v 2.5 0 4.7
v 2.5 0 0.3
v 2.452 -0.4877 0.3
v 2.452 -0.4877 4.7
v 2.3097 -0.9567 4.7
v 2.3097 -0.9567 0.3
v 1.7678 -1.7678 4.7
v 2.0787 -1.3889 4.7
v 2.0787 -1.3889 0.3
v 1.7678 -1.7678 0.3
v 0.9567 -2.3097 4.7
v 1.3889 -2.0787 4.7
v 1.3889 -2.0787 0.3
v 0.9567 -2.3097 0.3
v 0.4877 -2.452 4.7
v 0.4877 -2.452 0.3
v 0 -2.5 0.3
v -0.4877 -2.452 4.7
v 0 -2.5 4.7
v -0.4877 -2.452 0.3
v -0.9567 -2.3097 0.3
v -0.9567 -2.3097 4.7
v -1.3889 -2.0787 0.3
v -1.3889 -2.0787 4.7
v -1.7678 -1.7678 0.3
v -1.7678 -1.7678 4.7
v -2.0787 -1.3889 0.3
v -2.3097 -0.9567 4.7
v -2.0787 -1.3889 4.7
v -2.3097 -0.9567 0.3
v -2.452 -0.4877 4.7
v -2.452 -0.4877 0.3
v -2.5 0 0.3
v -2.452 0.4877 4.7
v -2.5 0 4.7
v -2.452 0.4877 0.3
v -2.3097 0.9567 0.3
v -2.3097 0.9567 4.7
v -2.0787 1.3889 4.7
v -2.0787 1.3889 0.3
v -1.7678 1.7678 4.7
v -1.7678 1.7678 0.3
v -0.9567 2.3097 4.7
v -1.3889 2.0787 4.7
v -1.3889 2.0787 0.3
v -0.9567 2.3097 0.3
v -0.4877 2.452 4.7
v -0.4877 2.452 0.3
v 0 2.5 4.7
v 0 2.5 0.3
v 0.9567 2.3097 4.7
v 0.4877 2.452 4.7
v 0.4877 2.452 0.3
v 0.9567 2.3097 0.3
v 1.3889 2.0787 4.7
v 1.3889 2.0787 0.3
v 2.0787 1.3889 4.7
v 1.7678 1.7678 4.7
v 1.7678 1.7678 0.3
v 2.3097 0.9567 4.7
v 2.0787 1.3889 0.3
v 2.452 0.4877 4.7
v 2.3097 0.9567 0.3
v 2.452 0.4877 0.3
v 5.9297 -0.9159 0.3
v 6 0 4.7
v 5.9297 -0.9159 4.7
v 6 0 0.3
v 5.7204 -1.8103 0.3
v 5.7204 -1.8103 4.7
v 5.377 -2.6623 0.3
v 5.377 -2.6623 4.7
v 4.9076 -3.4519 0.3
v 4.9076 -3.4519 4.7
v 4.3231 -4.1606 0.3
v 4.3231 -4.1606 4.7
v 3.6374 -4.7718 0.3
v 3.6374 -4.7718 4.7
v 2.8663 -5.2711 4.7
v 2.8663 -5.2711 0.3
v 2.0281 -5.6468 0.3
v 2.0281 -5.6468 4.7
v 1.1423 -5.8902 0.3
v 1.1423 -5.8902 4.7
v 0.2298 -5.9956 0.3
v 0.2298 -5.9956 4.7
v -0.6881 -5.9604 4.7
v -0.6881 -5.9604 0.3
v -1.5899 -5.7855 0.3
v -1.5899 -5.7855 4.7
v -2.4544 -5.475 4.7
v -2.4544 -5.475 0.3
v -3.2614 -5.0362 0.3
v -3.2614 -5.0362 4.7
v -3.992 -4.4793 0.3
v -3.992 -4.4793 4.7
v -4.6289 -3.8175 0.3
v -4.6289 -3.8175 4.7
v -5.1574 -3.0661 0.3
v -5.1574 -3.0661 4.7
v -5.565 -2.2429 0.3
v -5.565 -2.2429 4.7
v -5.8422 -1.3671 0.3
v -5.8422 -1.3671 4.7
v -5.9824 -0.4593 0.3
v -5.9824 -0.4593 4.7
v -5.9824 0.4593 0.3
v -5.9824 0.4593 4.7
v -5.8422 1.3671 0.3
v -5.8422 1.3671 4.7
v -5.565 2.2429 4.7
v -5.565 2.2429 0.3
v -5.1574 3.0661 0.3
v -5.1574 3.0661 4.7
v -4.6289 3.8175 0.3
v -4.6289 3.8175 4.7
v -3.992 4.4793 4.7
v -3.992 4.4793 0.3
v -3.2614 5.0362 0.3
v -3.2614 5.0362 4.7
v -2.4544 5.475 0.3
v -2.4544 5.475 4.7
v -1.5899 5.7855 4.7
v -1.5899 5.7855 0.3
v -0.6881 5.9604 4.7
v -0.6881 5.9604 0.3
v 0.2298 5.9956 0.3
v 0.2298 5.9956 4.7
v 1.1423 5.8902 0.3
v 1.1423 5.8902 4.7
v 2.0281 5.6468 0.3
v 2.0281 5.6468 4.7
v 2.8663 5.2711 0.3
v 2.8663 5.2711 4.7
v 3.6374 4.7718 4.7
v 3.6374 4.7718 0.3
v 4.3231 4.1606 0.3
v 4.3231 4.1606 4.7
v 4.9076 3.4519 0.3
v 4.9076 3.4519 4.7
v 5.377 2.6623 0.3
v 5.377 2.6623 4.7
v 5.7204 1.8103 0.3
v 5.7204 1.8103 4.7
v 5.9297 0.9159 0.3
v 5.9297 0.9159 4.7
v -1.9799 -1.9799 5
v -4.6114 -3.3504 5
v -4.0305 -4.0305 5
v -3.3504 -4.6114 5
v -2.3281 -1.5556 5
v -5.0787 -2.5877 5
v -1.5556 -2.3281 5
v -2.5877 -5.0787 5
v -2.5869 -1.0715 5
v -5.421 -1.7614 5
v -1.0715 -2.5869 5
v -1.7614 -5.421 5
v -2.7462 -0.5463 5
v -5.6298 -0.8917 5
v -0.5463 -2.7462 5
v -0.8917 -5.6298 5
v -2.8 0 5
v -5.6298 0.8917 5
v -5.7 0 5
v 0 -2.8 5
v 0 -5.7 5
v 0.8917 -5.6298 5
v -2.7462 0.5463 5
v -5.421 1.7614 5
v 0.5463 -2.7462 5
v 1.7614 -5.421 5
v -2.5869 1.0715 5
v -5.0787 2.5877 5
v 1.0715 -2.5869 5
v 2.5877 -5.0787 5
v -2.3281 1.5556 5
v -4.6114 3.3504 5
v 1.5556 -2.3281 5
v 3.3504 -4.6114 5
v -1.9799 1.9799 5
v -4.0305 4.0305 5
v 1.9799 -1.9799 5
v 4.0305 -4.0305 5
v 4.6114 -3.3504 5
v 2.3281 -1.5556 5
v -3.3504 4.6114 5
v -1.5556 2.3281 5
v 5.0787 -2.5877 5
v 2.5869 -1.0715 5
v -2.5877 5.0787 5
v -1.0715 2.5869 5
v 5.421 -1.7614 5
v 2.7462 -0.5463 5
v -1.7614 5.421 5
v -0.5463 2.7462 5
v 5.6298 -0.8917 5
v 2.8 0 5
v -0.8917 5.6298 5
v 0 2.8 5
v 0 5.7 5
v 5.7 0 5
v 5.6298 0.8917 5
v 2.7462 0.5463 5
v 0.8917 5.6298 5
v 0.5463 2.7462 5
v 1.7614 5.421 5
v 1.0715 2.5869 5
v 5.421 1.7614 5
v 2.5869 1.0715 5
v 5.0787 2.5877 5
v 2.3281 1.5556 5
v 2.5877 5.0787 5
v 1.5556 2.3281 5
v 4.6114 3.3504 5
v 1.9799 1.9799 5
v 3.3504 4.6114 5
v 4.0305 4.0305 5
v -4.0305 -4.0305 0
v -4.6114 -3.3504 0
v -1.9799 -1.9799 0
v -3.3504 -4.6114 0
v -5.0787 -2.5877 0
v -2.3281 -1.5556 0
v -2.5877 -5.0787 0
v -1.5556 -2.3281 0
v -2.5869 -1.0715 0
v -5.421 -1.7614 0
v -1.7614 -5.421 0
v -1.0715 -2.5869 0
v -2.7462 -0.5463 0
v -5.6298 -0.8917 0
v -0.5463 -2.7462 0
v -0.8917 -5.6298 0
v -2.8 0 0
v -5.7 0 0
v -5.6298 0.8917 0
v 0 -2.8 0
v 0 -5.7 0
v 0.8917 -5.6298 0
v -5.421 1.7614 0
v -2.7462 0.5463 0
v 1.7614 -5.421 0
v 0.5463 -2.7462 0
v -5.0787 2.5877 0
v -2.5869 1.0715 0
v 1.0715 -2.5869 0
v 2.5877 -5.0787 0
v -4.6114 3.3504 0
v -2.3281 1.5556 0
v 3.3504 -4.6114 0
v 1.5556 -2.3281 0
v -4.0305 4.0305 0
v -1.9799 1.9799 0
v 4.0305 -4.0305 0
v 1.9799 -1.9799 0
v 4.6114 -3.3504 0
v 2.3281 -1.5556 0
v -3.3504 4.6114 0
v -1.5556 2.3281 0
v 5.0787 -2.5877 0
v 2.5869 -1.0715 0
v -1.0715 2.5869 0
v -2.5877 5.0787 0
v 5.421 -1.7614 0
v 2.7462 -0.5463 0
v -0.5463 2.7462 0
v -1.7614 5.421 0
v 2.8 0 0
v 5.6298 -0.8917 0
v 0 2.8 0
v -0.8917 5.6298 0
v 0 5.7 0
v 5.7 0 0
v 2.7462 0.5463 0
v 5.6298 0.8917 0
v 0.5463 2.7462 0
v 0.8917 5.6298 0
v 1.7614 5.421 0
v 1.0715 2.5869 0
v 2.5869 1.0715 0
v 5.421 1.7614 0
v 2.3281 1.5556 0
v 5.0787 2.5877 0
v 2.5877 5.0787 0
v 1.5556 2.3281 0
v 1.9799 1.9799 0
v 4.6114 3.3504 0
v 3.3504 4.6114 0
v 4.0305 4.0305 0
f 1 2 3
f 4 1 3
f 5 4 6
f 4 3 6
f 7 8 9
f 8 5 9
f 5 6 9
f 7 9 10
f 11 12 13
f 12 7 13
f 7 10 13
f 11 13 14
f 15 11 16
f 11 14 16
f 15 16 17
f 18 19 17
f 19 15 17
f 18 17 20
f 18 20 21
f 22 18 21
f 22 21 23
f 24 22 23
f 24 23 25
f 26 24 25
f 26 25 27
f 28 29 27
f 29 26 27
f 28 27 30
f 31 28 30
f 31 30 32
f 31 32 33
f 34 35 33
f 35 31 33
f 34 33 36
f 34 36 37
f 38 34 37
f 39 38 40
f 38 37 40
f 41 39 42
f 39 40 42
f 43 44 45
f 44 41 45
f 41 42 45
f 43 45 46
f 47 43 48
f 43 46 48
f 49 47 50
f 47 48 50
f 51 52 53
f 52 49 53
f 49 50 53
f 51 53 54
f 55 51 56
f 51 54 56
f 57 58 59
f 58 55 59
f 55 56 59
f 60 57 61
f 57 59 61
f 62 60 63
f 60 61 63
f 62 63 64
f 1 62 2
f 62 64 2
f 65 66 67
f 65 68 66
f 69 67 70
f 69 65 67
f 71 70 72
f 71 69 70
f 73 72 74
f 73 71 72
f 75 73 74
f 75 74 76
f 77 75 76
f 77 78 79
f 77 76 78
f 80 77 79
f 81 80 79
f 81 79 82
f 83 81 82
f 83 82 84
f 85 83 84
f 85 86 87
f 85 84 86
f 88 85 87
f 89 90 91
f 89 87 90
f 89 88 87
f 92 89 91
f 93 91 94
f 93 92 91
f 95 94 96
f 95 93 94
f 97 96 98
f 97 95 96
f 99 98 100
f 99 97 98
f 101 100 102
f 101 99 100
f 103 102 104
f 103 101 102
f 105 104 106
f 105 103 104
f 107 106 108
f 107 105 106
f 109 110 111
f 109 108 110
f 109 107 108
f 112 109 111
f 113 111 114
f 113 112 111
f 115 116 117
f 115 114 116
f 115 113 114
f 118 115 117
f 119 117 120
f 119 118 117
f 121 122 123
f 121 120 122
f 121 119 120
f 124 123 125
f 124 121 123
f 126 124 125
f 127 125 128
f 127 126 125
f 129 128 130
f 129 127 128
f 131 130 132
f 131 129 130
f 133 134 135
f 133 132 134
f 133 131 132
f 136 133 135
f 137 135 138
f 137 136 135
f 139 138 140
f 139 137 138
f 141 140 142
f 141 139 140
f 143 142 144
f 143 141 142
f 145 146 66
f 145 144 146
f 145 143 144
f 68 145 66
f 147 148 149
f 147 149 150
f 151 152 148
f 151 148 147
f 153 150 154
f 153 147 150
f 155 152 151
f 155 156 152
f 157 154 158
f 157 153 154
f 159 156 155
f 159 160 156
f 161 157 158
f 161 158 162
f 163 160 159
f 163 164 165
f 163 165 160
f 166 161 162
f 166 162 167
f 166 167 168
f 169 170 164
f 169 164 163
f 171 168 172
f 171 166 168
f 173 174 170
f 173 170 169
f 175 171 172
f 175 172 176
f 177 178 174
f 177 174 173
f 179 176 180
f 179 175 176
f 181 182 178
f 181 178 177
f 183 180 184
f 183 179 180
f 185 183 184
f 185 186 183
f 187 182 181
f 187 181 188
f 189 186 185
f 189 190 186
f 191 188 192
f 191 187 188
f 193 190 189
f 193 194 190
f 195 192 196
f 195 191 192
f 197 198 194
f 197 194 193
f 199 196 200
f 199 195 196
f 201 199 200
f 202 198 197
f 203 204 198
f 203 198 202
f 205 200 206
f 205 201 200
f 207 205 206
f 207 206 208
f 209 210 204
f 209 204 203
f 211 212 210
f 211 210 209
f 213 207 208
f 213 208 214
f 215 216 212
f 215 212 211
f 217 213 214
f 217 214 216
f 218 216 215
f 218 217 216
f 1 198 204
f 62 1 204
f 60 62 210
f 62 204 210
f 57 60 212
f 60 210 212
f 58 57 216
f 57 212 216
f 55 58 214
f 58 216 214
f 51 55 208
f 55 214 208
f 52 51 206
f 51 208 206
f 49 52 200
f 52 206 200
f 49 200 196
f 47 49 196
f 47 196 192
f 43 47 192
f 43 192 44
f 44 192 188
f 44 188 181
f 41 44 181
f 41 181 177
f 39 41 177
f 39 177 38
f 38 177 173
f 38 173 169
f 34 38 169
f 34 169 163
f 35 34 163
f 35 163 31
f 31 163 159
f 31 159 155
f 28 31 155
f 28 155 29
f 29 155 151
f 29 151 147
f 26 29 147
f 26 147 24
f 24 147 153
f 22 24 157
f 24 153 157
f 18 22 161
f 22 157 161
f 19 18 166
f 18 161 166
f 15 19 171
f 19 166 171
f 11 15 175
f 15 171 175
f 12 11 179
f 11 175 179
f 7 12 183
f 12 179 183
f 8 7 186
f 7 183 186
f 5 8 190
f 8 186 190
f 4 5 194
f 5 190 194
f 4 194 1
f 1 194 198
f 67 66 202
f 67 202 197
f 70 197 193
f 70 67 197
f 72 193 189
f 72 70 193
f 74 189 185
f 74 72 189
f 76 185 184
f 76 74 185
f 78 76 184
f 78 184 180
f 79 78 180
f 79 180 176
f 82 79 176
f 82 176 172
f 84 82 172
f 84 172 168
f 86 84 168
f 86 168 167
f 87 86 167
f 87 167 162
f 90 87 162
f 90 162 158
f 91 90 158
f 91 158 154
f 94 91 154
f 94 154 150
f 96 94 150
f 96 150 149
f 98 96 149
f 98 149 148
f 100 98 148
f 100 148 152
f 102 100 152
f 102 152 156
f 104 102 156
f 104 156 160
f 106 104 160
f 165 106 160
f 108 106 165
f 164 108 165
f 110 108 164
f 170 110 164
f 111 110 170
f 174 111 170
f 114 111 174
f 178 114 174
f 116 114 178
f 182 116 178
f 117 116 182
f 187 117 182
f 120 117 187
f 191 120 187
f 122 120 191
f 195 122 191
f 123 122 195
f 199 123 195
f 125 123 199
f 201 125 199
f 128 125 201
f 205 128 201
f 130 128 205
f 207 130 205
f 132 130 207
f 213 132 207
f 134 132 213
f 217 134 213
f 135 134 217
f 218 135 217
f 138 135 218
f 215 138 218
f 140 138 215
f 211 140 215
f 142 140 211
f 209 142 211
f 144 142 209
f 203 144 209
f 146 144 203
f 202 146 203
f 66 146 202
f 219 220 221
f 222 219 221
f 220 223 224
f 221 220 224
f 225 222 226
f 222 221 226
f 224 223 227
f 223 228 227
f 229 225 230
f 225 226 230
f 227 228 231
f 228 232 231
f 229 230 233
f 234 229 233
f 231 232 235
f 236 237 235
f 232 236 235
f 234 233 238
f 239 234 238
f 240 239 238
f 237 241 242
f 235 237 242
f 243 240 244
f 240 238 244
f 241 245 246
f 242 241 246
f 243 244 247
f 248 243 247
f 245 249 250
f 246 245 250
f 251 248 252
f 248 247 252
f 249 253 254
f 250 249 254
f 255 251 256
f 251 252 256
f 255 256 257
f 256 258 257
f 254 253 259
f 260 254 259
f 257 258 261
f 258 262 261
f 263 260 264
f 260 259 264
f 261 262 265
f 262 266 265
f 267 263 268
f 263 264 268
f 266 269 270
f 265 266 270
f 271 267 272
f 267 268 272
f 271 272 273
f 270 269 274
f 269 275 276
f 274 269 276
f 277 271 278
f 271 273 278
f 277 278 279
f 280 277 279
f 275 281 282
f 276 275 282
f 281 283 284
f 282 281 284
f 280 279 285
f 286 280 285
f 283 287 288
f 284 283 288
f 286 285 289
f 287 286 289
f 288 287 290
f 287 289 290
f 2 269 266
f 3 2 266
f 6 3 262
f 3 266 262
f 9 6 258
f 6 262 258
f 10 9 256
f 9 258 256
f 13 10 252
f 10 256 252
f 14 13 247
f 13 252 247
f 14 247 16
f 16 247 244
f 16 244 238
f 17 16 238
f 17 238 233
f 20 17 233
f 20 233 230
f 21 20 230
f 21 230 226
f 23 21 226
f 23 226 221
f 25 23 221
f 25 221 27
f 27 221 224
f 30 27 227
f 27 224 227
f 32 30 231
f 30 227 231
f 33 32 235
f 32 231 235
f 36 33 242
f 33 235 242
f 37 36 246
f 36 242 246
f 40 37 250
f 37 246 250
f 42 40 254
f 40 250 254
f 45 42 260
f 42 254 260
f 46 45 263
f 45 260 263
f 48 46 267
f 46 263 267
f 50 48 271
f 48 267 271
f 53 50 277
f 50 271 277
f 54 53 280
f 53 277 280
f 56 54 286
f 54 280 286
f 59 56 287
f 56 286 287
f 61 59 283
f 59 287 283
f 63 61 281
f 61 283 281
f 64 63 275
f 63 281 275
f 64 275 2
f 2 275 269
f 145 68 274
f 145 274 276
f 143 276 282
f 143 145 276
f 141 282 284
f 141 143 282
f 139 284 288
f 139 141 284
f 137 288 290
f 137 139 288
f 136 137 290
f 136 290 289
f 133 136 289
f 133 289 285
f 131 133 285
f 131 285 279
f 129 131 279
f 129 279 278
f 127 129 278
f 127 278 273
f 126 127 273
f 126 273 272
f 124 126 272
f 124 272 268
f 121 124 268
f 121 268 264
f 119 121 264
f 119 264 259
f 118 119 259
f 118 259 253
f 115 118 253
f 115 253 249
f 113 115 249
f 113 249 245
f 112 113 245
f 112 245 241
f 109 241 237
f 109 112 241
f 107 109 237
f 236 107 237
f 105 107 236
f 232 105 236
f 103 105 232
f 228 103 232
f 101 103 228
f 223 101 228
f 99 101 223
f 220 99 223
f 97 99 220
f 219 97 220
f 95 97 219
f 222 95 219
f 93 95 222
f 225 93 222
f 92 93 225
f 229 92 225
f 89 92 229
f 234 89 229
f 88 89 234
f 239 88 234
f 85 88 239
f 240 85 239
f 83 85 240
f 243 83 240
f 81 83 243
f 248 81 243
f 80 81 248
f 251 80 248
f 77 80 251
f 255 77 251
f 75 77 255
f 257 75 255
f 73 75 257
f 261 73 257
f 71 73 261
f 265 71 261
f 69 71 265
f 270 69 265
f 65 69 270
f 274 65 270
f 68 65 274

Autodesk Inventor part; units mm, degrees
ref_plane "YZ Plane" through (0, 0, 0) normal (1, 0, 0) x (0, 1, 0)
ref_plane "XZ Plane" through (0, 0, 0) normal (0, 1, 0) x (-1, 0, 0)
ref_plane "XY Plane" through (0, 0, 0) normal (0, 0, 1) x (1, 0, 0)
sketch "Szkic1" plane through (0, 0, 0) normal (0, 0, 1) x (1, 0, 0)
  circle A0 centre (0, 0) radius 6
  circle A1 centre (0, 0) radius 2.5
  dimension "d0" = 12
  dimension "d1" = 5
extrude "Wyciągnięcie proste1" add sketch "Szkic1" along normal blind 5
chamfer "Faza1" distance 0.3 angle 45 2 edges at (-6, 0, 5) (-6, 0, 0)
chamfer "Faza2" distance 0.3 angle 45 2 edges at (-2.5, 0, 5) (-2.5, 0, 0)
properties part number "COTS_GENERIC_Bearing_12x5x5"
